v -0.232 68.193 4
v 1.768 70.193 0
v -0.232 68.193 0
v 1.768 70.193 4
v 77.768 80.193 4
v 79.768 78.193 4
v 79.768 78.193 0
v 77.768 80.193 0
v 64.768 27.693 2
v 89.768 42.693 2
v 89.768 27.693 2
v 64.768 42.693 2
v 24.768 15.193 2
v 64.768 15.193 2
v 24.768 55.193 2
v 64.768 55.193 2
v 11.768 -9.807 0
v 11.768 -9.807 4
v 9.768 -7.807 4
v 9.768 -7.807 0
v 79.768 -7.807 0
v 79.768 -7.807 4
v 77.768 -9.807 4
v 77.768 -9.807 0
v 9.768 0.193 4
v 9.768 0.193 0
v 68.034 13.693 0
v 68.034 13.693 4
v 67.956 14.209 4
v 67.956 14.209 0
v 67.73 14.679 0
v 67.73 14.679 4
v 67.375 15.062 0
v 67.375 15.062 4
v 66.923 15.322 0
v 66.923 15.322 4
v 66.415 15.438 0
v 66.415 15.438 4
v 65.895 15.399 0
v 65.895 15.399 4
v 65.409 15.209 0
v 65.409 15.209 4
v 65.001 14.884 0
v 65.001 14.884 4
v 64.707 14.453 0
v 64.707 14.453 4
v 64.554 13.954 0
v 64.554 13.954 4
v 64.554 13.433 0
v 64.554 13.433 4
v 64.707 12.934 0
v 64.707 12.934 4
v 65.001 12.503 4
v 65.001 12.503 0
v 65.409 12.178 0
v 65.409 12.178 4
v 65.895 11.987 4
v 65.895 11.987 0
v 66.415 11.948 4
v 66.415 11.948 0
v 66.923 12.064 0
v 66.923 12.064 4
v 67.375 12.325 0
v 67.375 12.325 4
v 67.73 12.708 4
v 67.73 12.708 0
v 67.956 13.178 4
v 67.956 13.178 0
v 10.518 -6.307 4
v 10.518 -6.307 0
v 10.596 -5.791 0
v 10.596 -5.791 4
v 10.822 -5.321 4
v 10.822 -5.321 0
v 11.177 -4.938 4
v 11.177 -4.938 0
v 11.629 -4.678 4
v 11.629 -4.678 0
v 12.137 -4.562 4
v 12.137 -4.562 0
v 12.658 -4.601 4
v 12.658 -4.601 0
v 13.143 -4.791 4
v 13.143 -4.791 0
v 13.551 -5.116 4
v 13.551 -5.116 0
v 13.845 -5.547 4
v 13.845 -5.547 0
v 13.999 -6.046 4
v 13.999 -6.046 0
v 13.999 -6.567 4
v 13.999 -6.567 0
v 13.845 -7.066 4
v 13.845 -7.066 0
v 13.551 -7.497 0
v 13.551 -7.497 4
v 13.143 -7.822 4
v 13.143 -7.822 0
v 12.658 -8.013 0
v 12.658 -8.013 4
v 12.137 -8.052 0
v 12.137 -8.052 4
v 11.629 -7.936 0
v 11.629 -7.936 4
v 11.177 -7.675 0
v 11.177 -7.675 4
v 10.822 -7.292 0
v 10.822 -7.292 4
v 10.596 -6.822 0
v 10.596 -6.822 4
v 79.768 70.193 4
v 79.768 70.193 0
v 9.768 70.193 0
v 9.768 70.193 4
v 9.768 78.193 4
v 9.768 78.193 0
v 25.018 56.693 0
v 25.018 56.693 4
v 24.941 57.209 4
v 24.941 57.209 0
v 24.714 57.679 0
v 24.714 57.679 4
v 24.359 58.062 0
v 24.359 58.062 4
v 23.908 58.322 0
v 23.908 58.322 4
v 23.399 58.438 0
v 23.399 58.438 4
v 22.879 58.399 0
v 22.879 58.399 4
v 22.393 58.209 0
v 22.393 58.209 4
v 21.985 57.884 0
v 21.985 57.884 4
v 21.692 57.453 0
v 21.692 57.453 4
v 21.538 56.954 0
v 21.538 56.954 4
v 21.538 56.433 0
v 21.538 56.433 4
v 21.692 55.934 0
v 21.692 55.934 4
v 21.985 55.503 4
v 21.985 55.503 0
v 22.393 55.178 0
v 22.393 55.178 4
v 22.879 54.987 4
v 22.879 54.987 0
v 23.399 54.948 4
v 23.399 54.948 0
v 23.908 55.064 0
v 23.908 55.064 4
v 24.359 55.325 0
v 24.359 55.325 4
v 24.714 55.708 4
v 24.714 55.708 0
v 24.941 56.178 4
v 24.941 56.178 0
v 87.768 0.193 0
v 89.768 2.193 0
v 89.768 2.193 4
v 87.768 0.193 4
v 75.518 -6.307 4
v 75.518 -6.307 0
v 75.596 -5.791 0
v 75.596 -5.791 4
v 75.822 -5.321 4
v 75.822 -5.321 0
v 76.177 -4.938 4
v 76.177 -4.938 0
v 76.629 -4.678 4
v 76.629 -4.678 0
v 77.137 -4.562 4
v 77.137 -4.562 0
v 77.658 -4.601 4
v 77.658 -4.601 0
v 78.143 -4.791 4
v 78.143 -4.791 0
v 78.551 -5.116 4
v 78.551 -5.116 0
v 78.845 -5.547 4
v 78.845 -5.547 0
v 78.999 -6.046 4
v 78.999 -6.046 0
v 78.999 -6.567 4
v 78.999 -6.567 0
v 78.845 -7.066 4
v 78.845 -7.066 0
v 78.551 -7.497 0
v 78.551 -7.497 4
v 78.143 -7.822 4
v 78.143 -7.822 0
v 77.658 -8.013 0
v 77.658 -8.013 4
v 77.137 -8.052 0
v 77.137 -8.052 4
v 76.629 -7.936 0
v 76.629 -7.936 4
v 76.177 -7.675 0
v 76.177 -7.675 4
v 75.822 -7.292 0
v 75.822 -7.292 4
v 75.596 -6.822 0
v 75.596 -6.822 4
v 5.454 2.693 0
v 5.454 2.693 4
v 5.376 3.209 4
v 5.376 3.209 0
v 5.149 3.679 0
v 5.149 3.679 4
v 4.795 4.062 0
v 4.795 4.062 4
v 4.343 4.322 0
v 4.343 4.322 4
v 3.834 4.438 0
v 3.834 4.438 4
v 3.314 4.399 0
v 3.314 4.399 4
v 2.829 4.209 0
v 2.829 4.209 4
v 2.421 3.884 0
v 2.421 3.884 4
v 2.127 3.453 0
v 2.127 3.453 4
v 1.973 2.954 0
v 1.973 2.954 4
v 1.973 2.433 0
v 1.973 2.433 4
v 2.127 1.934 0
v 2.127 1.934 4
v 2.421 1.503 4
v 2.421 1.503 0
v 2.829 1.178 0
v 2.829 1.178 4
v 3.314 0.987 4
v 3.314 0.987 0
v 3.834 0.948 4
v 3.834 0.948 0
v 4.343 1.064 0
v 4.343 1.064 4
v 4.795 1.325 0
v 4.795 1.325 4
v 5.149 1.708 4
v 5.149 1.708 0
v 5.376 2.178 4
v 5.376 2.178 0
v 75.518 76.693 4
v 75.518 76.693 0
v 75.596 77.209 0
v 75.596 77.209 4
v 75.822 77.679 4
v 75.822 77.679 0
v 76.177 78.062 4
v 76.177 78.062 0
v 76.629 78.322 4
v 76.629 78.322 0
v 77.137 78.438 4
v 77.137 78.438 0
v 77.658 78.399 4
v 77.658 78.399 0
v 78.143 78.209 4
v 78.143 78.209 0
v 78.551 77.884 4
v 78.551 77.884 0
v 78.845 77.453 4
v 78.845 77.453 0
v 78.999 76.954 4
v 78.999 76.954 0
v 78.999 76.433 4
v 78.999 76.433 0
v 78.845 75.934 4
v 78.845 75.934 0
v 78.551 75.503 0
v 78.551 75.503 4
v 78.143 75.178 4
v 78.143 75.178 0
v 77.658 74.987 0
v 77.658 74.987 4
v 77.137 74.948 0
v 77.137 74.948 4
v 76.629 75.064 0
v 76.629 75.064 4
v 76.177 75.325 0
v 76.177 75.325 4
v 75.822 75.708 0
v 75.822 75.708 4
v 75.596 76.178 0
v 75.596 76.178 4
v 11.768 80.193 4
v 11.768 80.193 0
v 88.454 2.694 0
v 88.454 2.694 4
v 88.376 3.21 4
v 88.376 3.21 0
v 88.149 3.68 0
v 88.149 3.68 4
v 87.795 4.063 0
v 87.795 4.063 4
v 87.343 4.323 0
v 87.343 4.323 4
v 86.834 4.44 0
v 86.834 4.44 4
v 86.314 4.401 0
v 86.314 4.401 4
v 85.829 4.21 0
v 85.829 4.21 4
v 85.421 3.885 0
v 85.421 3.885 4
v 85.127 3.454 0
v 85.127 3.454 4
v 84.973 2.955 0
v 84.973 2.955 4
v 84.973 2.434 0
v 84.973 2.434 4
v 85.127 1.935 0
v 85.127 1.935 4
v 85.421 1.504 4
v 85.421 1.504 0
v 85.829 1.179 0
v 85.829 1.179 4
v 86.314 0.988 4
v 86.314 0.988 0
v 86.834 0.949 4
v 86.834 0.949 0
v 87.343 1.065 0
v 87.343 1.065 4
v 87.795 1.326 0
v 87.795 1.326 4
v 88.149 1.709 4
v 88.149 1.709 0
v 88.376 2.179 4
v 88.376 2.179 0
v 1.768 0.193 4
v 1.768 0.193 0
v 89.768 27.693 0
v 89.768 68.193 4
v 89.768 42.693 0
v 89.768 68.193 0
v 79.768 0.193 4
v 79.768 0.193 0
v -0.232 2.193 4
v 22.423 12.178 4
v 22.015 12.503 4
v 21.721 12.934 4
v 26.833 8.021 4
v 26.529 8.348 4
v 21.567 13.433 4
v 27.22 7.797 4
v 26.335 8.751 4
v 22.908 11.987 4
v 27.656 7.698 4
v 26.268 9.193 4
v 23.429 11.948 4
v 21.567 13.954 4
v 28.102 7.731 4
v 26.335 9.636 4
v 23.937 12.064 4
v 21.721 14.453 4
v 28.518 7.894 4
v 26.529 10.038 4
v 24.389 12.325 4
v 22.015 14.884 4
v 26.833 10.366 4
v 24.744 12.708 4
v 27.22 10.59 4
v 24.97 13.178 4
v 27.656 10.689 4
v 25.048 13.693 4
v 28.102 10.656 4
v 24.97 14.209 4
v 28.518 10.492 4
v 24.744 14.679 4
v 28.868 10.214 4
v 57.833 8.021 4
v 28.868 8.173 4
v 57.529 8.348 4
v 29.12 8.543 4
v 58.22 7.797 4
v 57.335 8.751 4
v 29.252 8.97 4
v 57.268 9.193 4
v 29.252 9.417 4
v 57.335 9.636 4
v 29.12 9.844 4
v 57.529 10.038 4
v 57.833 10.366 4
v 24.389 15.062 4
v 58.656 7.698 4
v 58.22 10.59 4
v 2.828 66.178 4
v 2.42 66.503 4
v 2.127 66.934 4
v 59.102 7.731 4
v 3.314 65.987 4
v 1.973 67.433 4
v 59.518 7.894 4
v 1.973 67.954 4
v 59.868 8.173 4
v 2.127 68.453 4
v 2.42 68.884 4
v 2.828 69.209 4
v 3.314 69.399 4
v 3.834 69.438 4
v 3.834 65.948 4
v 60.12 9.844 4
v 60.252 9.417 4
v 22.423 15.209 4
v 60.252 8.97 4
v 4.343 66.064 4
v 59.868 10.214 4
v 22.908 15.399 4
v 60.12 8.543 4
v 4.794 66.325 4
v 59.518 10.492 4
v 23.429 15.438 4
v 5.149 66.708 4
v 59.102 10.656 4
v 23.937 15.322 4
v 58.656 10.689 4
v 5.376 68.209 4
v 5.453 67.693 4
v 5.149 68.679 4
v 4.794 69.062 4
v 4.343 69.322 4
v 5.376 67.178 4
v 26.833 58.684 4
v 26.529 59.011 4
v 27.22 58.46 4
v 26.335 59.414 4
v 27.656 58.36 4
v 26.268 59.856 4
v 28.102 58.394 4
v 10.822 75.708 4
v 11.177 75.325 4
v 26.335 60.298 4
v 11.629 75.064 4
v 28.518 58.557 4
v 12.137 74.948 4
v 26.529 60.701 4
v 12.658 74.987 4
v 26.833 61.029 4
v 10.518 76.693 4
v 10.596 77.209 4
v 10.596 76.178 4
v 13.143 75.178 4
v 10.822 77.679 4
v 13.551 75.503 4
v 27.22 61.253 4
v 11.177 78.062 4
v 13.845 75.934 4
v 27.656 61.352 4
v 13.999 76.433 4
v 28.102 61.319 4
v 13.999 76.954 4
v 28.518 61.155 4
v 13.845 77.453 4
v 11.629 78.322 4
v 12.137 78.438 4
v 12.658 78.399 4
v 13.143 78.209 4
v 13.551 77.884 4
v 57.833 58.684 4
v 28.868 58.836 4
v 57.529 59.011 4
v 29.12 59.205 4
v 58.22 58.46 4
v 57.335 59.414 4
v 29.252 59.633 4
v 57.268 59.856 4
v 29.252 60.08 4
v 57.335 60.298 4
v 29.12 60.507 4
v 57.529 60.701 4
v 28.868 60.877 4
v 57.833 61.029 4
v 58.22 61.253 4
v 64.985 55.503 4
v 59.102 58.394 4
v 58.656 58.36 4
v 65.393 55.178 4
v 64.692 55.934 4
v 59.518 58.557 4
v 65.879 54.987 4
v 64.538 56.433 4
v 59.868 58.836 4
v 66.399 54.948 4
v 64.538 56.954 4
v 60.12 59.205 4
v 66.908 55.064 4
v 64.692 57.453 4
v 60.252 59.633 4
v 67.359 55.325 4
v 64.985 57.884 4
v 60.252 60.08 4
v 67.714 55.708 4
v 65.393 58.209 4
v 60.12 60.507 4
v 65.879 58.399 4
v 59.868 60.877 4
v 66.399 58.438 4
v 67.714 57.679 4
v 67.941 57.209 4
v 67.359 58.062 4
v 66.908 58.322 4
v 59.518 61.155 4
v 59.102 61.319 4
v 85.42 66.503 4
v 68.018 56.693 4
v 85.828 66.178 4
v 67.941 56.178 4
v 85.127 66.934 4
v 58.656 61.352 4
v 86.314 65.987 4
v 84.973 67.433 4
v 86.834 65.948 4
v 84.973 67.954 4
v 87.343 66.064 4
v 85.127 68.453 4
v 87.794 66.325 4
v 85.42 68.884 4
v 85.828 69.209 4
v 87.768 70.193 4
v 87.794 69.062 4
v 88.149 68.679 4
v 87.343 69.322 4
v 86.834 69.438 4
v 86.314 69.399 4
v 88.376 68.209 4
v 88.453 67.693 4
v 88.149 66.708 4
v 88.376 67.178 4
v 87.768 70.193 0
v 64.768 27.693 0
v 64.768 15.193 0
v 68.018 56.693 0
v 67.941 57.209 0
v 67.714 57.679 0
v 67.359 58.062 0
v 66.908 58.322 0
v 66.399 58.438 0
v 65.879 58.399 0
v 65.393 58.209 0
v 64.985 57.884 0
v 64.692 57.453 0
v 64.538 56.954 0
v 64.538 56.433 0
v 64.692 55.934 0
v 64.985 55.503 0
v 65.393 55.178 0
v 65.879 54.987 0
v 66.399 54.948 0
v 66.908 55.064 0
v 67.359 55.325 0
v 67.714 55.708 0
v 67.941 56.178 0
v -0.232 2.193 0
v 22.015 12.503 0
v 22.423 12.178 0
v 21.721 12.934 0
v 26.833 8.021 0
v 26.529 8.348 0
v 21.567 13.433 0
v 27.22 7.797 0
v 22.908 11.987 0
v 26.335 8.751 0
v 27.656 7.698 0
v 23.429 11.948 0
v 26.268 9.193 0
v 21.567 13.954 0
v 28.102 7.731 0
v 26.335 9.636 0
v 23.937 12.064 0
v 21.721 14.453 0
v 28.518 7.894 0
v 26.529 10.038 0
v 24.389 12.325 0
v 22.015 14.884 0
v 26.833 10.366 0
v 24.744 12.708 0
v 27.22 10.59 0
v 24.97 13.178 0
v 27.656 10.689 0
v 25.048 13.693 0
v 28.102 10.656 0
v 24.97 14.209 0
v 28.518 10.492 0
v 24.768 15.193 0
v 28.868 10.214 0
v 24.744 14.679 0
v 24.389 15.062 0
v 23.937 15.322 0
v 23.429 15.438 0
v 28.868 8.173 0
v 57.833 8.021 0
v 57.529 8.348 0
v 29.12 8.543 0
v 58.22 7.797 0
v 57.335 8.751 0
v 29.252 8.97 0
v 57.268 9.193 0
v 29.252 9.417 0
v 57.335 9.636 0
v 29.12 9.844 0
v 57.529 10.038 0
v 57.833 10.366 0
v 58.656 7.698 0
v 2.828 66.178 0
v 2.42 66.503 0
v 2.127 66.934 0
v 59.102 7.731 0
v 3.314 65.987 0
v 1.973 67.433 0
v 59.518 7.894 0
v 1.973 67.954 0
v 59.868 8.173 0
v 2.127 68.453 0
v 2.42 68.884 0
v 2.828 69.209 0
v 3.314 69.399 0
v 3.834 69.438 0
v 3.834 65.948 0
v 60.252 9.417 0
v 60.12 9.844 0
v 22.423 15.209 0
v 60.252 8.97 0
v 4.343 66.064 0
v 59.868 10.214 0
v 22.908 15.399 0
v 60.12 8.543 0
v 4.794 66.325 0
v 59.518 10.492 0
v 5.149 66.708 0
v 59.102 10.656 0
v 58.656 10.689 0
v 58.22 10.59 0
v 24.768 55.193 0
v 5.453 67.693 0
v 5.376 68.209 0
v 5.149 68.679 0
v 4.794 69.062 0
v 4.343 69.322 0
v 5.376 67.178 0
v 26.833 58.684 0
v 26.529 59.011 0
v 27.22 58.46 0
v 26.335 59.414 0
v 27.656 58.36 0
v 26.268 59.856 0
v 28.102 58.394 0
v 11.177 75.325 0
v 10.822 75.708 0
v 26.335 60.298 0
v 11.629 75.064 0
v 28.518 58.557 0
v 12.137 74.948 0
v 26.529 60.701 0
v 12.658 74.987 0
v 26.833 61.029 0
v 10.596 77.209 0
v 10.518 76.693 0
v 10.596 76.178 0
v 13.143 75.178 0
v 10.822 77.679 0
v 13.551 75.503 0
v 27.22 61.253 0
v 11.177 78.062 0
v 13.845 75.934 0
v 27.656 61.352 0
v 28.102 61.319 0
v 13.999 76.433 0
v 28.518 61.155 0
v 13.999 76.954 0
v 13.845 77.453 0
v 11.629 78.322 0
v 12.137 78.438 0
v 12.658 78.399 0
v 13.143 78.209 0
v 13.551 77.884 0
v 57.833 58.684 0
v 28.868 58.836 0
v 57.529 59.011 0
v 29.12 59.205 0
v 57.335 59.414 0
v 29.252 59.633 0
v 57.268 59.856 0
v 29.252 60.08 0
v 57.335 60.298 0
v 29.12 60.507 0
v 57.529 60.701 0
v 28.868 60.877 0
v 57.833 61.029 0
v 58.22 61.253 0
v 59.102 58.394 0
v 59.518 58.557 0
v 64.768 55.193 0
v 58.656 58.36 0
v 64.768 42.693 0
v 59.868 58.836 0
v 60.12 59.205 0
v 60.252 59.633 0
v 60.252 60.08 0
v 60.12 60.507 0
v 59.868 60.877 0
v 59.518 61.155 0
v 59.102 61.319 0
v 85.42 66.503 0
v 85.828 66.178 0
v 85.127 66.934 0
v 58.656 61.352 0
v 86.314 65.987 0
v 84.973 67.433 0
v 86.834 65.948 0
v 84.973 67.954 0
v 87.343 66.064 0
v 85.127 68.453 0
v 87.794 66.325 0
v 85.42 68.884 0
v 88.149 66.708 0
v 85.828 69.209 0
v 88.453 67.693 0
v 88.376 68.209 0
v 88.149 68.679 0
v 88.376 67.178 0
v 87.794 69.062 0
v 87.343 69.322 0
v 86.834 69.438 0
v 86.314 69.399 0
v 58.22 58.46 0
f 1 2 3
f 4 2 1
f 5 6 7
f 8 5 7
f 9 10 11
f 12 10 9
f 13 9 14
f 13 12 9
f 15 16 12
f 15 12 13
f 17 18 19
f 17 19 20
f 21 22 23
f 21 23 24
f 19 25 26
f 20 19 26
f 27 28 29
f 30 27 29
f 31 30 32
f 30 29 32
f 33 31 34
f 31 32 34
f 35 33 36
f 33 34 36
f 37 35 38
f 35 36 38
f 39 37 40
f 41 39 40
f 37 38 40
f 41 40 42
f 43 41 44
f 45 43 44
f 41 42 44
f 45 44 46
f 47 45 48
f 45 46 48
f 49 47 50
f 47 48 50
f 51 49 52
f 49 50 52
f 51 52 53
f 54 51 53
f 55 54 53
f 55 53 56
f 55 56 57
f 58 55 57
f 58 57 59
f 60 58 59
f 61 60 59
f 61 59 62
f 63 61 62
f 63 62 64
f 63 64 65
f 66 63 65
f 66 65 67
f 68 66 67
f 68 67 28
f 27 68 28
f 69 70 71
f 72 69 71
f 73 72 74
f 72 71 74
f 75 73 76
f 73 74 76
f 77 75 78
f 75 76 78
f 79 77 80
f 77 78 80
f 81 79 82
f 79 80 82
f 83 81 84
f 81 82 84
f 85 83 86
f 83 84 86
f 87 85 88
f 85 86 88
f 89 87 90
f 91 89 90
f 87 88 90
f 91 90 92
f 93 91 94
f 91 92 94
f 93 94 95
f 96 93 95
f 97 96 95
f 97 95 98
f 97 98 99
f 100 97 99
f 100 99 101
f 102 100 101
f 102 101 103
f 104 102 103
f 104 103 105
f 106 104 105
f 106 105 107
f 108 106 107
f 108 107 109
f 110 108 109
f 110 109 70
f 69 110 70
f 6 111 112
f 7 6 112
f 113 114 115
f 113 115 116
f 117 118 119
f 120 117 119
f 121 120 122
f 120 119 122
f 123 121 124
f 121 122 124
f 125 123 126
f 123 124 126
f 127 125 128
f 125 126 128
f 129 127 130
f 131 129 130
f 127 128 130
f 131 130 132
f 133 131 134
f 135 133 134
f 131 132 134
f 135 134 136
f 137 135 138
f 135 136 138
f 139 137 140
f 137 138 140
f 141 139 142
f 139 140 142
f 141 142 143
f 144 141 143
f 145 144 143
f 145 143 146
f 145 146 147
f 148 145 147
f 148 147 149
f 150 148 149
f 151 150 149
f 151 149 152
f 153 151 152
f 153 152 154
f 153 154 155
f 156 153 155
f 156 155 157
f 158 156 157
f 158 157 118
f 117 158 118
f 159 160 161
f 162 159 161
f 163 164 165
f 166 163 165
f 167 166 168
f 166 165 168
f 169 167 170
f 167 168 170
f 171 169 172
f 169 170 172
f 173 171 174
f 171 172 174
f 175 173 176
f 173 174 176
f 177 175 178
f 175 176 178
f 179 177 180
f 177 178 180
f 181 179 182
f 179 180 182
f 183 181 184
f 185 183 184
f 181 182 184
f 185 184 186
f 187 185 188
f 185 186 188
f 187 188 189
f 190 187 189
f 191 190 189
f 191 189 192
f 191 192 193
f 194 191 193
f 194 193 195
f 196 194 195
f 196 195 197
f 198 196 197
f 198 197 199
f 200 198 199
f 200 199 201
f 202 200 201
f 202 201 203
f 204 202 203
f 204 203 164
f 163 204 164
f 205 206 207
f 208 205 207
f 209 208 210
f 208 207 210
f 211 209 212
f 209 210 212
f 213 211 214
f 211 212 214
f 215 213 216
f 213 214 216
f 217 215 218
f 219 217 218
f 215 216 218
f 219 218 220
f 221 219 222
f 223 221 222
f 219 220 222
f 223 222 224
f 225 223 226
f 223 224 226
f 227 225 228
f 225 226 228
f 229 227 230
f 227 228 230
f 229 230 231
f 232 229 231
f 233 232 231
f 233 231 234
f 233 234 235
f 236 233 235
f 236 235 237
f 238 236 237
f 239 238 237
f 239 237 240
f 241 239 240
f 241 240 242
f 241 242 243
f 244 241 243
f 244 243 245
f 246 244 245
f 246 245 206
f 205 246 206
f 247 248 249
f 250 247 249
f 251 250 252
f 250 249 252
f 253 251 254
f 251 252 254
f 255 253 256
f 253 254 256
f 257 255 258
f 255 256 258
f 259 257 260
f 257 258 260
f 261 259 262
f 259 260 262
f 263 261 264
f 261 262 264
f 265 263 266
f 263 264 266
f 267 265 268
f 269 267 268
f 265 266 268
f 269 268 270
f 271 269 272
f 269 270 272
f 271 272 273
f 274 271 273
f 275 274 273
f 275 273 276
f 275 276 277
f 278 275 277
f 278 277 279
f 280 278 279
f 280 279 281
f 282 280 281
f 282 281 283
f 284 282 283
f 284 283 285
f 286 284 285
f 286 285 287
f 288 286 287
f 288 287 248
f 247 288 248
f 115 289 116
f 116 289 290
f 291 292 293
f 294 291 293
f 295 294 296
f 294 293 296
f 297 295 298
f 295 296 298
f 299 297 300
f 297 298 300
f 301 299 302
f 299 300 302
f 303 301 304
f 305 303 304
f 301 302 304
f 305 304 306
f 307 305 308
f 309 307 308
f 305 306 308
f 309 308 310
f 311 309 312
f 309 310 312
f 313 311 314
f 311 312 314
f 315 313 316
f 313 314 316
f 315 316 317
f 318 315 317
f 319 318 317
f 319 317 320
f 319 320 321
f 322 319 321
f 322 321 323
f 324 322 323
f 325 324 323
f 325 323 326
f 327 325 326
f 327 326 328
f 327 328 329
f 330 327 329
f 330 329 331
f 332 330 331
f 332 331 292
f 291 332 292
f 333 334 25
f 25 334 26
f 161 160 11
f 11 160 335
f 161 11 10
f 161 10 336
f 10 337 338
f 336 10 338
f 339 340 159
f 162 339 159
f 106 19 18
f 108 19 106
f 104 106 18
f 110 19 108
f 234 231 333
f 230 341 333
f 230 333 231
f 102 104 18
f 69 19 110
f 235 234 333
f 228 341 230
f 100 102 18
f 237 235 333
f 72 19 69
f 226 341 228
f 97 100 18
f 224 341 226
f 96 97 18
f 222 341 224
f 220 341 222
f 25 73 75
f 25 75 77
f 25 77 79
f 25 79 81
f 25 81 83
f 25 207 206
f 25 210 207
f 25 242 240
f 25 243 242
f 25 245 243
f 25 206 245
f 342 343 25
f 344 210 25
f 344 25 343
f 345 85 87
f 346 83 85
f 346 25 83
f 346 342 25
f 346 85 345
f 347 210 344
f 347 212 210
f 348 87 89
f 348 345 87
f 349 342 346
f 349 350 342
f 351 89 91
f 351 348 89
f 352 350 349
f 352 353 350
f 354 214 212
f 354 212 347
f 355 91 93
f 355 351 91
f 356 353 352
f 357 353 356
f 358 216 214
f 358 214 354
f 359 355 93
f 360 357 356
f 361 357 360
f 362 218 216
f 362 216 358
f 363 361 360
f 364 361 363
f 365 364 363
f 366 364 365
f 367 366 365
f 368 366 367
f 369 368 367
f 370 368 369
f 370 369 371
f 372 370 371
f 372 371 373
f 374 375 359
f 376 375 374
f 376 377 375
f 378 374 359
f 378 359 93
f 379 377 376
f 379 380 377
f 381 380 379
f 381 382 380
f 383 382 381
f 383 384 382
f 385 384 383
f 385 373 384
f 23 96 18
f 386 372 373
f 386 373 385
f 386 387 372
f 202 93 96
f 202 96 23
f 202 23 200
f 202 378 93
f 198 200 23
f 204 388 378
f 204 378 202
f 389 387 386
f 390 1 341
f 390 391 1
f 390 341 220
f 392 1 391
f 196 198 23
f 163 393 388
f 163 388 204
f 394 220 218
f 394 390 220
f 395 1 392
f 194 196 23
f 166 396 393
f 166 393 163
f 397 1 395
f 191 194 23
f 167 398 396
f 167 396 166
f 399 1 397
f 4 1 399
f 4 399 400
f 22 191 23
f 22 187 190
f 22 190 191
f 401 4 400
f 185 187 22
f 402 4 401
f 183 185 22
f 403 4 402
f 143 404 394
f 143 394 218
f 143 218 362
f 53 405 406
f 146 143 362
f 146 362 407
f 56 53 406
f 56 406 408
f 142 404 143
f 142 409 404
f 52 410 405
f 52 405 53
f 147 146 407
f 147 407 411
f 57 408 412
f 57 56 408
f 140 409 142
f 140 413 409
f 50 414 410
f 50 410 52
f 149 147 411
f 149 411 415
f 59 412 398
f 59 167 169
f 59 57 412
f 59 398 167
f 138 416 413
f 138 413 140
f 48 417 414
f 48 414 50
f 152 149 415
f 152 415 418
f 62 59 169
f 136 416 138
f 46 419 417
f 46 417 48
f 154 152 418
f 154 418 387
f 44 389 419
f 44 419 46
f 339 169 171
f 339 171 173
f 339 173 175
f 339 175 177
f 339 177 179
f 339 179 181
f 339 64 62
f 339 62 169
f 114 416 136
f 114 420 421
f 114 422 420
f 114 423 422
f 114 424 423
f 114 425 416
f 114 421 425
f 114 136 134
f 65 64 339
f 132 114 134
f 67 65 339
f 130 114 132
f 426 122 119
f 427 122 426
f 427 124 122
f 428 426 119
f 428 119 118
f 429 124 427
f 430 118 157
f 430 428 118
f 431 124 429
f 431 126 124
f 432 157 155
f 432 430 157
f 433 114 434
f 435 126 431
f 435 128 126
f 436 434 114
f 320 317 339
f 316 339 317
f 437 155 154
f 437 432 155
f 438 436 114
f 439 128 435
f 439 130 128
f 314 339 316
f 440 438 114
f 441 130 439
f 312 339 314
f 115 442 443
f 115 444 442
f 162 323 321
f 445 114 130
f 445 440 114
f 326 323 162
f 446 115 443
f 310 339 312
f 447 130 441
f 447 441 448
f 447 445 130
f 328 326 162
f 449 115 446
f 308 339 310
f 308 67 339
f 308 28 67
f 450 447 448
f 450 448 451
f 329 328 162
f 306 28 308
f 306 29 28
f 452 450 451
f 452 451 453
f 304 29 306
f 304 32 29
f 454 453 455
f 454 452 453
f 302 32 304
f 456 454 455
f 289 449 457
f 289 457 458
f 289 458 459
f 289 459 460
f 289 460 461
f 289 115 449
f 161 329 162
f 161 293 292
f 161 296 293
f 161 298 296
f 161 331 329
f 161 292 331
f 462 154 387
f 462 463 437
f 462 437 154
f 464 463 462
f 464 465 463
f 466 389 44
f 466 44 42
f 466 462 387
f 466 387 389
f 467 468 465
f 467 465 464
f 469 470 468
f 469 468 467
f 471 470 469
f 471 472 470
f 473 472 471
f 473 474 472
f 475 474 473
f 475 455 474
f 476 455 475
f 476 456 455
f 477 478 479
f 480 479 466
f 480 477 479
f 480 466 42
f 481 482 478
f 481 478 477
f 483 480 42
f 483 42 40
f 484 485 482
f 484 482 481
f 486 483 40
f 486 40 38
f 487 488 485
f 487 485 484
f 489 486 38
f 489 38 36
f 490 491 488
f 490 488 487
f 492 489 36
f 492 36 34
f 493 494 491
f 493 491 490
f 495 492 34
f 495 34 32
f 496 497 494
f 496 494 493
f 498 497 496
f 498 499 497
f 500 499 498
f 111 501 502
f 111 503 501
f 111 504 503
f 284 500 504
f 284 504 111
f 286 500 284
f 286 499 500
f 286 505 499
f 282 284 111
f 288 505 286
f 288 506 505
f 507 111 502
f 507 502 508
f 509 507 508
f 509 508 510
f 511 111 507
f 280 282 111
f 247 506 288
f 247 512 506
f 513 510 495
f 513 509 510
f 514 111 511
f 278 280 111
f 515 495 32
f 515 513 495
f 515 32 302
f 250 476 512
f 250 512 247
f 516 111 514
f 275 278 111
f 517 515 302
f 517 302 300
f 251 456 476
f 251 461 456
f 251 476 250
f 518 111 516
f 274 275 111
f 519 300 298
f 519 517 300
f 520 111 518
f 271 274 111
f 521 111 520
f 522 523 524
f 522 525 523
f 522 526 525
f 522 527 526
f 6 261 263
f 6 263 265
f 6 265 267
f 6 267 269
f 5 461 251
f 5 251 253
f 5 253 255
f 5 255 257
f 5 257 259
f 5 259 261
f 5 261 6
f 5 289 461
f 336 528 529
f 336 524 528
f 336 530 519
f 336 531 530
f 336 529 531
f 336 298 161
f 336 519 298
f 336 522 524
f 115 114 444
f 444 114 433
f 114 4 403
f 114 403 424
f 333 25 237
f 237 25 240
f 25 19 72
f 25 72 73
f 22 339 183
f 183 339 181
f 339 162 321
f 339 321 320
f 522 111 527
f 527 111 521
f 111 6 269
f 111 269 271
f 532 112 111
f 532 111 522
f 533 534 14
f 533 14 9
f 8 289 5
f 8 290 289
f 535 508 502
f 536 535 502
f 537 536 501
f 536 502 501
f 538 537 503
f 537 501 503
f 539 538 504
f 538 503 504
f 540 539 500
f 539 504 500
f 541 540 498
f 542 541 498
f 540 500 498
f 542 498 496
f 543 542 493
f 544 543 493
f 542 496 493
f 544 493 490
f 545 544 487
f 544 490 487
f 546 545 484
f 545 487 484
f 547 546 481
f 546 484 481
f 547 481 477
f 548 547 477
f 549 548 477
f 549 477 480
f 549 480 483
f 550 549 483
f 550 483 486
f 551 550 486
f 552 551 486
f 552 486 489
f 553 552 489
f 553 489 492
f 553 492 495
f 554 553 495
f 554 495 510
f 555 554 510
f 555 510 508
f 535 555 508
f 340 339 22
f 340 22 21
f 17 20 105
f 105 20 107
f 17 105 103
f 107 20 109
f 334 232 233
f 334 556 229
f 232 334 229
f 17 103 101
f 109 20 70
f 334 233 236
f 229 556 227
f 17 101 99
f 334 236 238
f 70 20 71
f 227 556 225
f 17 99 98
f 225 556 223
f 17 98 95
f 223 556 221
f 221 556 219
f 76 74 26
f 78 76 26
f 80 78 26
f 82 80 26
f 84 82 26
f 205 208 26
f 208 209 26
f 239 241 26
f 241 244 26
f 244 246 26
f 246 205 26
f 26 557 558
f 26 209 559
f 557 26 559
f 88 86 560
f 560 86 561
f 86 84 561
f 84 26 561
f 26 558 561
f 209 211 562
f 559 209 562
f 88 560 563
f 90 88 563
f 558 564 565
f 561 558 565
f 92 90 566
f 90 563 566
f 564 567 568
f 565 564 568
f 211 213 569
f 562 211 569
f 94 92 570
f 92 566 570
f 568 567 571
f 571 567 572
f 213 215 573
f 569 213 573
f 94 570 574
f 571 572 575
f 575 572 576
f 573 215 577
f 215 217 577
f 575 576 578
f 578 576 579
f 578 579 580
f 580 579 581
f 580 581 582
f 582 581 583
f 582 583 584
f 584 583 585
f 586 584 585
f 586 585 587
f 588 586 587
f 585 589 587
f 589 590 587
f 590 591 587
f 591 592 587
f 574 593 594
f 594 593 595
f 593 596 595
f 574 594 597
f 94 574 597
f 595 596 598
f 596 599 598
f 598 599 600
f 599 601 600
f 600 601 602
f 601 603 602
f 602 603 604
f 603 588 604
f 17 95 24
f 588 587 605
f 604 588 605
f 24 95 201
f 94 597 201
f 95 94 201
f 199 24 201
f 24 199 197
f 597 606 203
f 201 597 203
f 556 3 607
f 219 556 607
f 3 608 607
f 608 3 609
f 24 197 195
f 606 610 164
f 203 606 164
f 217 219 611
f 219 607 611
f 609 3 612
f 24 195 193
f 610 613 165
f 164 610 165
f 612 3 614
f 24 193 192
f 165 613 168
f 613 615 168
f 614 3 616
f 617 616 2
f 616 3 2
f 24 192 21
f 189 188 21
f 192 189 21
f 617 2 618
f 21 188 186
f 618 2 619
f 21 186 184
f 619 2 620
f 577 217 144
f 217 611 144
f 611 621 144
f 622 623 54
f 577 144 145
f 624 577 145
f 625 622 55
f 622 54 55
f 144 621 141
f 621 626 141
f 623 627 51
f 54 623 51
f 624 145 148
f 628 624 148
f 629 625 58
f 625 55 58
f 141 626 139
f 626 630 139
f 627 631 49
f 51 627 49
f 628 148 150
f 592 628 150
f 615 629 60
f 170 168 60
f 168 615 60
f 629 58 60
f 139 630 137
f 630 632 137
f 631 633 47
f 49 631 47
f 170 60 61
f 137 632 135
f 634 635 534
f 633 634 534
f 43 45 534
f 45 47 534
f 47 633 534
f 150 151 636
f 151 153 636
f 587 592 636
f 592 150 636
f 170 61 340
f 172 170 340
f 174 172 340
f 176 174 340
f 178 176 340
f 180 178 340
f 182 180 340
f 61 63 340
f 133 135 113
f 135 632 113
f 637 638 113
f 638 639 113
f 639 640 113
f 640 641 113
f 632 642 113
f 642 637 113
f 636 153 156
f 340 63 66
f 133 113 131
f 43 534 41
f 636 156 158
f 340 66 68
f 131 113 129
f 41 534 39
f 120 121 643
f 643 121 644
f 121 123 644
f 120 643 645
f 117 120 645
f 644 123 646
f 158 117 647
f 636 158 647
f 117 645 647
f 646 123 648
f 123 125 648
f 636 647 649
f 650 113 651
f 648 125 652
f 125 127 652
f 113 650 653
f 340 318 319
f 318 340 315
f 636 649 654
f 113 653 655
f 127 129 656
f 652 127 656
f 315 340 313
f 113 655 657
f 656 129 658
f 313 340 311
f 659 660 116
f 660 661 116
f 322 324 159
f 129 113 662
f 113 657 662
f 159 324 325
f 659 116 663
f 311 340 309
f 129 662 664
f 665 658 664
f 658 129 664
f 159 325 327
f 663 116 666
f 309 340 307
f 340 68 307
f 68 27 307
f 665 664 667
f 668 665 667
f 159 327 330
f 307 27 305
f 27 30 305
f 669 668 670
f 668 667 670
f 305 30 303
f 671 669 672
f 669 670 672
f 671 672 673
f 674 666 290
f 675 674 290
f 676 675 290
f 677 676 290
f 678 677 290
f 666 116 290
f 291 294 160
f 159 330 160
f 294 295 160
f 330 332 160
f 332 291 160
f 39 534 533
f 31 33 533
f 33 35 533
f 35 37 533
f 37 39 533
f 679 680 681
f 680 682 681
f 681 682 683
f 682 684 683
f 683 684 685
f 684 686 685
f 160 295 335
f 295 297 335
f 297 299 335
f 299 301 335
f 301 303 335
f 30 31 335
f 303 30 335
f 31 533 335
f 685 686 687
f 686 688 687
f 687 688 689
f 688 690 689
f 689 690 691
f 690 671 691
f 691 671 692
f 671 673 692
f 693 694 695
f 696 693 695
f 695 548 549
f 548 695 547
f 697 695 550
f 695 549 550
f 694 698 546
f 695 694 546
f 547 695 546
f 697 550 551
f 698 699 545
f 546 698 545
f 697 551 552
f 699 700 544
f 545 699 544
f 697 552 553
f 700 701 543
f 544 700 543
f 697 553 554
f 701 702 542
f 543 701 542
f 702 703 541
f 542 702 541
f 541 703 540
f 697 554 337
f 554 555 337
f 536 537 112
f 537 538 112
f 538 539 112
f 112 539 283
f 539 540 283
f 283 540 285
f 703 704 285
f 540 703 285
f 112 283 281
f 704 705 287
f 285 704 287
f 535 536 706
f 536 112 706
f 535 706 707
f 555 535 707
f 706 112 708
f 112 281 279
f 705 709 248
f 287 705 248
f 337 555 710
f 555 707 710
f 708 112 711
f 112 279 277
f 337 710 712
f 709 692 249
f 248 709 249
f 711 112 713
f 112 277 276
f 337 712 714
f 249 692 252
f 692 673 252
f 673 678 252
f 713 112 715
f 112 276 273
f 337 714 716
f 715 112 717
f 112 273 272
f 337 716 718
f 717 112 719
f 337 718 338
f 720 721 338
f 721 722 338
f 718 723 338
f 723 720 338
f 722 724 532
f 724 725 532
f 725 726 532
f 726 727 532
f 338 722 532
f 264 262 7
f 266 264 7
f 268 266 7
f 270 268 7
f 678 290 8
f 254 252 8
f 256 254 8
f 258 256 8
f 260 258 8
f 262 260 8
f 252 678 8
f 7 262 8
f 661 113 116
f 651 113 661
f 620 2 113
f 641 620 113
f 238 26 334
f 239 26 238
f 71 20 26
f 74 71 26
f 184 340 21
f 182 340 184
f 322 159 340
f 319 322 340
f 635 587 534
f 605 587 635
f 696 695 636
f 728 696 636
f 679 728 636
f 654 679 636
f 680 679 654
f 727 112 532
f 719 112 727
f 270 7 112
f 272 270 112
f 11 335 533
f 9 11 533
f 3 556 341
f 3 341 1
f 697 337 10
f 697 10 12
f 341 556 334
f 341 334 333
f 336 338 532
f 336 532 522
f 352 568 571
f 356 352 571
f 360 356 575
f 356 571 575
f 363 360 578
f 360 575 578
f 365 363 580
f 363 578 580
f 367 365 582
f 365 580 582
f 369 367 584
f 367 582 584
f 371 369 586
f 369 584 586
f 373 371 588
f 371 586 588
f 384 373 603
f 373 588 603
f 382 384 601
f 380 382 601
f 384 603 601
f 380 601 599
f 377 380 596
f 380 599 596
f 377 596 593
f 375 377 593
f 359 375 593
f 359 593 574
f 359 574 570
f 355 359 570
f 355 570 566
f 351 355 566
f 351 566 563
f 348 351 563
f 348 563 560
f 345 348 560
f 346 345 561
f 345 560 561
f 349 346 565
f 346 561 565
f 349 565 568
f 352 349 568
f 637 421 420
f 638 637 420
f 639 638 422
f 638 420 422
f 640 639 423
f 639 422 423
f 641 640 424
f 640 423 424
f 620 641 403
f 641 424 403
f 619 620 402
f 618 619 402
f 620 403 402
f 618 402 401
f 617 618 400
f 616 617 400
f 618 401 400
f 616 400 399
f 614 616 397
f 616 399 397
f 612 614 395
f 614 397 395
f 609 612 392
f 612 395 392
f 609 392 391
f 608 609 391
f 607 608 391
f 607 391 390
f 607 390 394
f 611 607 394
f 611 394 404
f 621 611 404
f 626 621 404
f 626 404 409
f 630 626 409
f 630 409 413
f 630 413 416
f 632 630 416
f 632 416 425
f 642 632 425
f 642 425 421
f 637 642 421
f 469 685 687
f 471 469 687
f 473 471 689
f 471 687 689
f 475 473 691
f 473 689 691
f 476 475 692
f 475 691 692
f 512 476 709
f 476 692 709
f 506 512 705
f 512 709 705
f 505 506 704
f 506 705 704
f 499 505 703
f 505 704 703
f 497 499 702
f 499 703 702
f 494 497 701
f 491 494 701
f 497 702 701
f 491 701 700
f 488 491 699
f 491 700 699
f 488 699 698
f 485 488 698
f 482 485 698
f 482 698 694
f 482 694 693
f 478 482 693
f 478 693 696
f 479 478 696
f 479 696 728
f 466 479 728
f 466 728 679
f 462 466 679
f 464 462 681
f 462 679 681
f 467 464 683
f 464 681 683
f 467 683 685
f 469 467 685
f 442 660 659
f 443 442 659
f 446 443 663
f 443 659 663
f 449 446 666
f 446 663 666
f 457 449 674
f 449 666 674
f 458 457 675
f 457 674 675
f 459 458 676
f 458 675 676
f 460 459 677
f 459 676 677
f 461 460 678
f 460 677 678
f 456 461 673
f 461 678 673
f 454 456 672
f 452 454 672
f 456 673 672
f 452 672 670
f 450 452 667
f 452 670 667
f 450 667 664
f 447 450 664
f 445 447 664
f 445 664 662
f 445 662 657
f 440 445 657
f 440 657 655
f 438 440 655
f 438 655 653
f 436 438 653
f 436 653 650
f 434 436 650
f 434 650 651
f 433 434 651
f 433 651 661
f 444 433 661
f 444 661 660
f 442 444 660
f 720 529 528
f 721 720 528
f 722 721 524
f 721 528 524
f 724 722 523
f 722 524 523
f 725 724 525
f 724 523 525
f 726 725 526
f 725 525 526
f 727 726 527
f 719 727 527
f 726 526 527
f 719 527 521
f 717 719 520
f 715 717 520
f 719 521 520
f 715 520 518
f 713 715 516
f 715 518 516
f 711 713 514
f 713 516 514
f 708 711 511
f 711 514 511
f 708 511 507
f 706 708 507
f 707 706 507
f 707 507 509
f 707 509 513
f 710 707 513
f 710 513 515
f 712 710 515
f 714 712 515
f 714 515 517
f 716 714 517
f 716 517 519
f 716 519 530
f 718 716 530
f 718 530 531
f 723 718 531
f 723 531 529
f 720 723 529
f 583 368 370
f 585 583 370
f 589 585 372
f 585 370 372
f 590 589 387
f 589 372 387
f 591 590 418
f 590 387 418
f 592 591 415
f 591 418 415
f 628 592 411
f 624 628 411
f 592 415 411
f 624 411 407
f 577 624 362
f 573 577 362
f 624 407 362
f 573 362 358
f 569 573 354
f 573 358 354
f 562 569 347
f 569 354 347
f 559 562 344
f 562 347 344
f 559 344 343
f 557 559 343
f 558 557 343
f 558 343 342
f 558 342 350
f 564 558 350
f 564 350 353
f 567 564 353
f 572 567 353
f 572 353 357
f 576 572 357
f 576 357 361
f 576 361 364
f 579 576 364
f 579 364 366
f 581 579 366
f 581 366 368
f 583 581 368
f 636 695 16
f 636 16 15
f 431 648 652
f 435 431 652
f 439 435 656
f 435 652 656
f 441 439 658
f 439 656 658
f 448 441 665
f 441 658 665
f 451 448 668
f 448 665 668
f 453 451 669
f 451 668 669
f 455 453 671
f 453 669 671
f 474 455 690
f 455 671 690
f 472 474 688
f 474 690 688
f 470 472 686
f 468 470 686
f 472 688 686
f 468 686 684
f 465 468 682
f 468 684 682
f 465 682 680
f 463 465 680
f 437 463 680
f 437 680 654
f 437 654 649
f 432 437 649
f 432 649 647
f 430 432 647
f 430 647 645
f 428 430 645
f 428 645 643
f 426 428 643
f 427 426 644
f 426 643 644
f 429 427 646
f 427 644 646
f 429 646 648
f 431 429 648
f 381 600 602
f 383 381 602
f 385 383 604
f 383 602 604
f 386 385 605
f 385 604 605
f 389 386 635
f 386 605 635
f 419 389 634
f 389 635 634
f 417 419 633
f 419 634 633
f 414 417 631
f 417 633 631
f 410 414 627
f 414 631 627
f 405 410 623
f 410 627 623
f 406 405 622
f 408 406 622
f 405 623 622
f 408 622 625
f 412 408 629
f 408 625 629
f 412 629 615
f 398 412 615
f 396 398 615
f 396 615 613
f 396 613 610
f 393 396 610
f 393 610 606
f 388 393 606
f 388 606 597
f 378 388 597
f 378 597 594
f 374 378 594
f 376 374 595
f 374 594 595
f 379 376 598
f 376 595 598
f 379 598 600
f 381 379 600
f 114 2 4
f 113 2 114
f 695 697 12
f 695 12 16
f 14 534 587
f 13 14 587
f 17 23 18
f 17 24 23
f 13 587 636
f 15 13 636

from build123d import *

# Parameters (mm, degrees)
SKETCH1_W           = 90
SKETCH1_H           = 70
BOSS_EXTRUDE1_DEPTH = 4
SKETCH2_R           = 1.75
CUT_EXTRUDE1_DEPTH  = 5
CHAMFER1_SIZE       = 2
CHAMFER2_SIZE       = 2
CHAMFER3_SIZE       = 2
CHAMFER4_SIZE       = 2
SKETCH5_W           = 70
SKETCH5_H           = 4
BOSS_EXTRUDE3_DEPTH = 10
SKETCH4_W           = 70
SKETCH4_H           = 4
BOSS_EXTRUDE4_DEPTH = 10
SKETCH6_R           = 1.75
CUT_EXTRUDE2_DEPTH  = 10
CHAMFER5_SIZE       = 2
SKETCH7_W           = 40
SKETCH7_H           = 40
CUT_EXTRUDE3_DEPTH  = 2
SKETCH8_W           = 25
SKETCH8_H           = 15
CUT_EXTRUDE4_DEPTH  = 2
SKETCH9_R           = 1.5
CUT_EXTRUDE5_DEPTH  = 4


with BuildPart() as part:
    # Sketch1 → Boss-Extrude1 (new body)
    with BuildSketch(Plane.XY):
        with Locations((44.768273235, 35.193370166)):
            Rectangle(SKETCH1_W, SKETCH1_H)
    extrude(amount=BOSS_EXTRUDE1_DEPTH)

    # Sketch2 → Cut-Extrude1 (cut)
    with BuildSketch(Plane.XY.offset(4)):
        with Locations((3.703568783, 2.693370166)):
            Circle(SKETCH2_R)
        with Locations((86.703568783, 2.694436567)):
            Circle(SKETCH2_R)
        with Locations((86.703273235, 67.693370166)):
            Circle(SKETCH2_R)
        with Locations((3.703273235, 67.693370166)):
            Circle(SKETCH2_R)
        with Locations((23.297725672, 13.693370166)):
            Circle(SKETCH2_R)
        with Locations((66.284051901, 13.693370166)):
            Circle(SKETCH2_R)
        with Locations((66.268273235, 56.693370166)):
            Circle(SKETCH2_R)
        with Locations((23.268273235, 56.693370166)):
            Circle(SKETCH2_R)
    extrude(amount=-CUT_EXTRUDE1_DEPTH, mode=Mode.SUBTRACT)

    # Chamfer1
    chamfer1_edges = [part.edges().sort_by_distance(p)[0] for p in [
        (89.768273235, 0.193370166, 2),
    ]]
    chamfer(chamfer1_edges, length=CHAMFER1_SIZE)

    # Chamfer2
    chamfer2_edges = [part.edges().sort_by_distance(p)[0] for p in [
        (-0.231726765, 0.193370166, 2),
    ]]
    chamfer(chamfer2_edges, length=CHAMFER2_SIZE)

    # Chamfer3
    chamfer3_edges = [part.edges().sort_by_distance(p)[0] for p in [
        (-0.231726765, 70.193370166, 2),
    ]]
    chamfer(chamfer3_edges, length=CHAMFER3_SIZE)

    # Chamfer4
    chamfer4_edges = [part.edges().sort_by_distance(p)[0] for p in [
        (89.768273235, 70.193370166, 2),
    ]]
    chamfer(chamfer4_edges, length=CHAMFER4_SIZE)

    # Sketch5 → Boss-Extrude3 (add)
    with BuildSketch(Plane(origin=(0, 70.193370166, 0), x_dir=(1, 0, 0), z_dir=(0, 1, 0))):
        with Locations((44.768273235, -2)):
            Rectangle(SKETCH5_W, SKETCH5_H)
    extrude(amount=BOSS_EXTRUDE3_DEPTH)

    # Sketch4 → Boss-Extrude4 (add)
    with BuildSketch(Plane(origin=(0, 0.193370166, 0), x_dir=(-1, 0, 0), z_dir=(0, -1, 0))):
        with Locations((-44.768273235, -2)):
            Rectangle(SKETCH4_W, SKETCH4_H)
    extrude(amount=BOSS_EXTRUDE4_DEPTH)

    # Sketch6 → Cut-Extrude2 (cut)
    with BuildSketch(Plane(origin=(0, 0, 0), x_dir=(-1, 0, 0), z_dir=(0, 0, -1))):
        with Locations((-12.268273235, 76.693370166)):
            Circle(SKETCH6_R)
        with Locations((-77.268273235, 76.693370166)):
            Circle(SKETCH6_R)
        with Locations((-77.268273235, -6.306629834)):
            Circle(SKETCH6_R)
        with Locations((-12.268273235, -6.306629834)):
            Circle(SKETCH6_R)
    extrude(amount=-CUT_EXTRUDE2_DEPTH, mode=Mode.SUBTRACT)

    # Chamfer5
    chamfer5_edges = [part.edges().sort_by_distance(p)[0] for p in [
        (9.768273235, 80.193370166, 2),
        (79.768273235, 80.193370166, 2),
        (9.768273235, -9.806629834, 2),
        (79.768273235, -9.806629834, 2),
    ]]
    chamfer(chamfer5_edges, length=CHAMFER5_SIZE)

    # Sketch7 → Cut-Extrude3 (cut)
    with BuildSketch(Plane(origin=(0, 0, 0), x_dir=(-1, 0, 0), z_dir=(0, 0, -1))):
        with Locations((-44.768273235, 35.193370166)):
            Rectangle(SKETCH7_W, SKETCH7_H)
    extrude(amount=-CUT_EXTRUDE3_DEPTH, mode=Mode.SUBTRACT)

    # Sketch8 → Cut-Extrude4 (cut)
    with BuildSketch(Plane(origin=(0, 0, 0), x_dir=(-1, 0, 0), z_dir=(0, 0, -1))):
        with Locations((-77.268273235, 35.193370166)):
            Rectangle(SKETCH8_W, SKETCH8_H)
    extrude(amount=-CUT_EXTRUDE4_DEPTH, mode=Mode.SUBTRACT)

    # Sketch9 → Cut-Extrude5 (cut)
    with BuildSketch(Plane(origin=(0, 0, 0), x_dir=(-1, 0, 0), z_dir=(0, 0, -1))):
        with Locations((-27.768273235, 9.193370166)):
            Circle(SKETCH9_R)
        with Locations((-58.768273235, 9.193370166)):
            Circle(SKETCH9_R)
        with Locations((-27.768273235, 59.856282799)):
            Circle(SKETCH9_R)
        with Locations((-58.768273235, 59.856282799)):
            Circle(SKETCH9_R)
    extrude(amount=-CUT_EXTRUDE5_DEPTH, mode=Mode.SUBTRACT)


solid = part.part
